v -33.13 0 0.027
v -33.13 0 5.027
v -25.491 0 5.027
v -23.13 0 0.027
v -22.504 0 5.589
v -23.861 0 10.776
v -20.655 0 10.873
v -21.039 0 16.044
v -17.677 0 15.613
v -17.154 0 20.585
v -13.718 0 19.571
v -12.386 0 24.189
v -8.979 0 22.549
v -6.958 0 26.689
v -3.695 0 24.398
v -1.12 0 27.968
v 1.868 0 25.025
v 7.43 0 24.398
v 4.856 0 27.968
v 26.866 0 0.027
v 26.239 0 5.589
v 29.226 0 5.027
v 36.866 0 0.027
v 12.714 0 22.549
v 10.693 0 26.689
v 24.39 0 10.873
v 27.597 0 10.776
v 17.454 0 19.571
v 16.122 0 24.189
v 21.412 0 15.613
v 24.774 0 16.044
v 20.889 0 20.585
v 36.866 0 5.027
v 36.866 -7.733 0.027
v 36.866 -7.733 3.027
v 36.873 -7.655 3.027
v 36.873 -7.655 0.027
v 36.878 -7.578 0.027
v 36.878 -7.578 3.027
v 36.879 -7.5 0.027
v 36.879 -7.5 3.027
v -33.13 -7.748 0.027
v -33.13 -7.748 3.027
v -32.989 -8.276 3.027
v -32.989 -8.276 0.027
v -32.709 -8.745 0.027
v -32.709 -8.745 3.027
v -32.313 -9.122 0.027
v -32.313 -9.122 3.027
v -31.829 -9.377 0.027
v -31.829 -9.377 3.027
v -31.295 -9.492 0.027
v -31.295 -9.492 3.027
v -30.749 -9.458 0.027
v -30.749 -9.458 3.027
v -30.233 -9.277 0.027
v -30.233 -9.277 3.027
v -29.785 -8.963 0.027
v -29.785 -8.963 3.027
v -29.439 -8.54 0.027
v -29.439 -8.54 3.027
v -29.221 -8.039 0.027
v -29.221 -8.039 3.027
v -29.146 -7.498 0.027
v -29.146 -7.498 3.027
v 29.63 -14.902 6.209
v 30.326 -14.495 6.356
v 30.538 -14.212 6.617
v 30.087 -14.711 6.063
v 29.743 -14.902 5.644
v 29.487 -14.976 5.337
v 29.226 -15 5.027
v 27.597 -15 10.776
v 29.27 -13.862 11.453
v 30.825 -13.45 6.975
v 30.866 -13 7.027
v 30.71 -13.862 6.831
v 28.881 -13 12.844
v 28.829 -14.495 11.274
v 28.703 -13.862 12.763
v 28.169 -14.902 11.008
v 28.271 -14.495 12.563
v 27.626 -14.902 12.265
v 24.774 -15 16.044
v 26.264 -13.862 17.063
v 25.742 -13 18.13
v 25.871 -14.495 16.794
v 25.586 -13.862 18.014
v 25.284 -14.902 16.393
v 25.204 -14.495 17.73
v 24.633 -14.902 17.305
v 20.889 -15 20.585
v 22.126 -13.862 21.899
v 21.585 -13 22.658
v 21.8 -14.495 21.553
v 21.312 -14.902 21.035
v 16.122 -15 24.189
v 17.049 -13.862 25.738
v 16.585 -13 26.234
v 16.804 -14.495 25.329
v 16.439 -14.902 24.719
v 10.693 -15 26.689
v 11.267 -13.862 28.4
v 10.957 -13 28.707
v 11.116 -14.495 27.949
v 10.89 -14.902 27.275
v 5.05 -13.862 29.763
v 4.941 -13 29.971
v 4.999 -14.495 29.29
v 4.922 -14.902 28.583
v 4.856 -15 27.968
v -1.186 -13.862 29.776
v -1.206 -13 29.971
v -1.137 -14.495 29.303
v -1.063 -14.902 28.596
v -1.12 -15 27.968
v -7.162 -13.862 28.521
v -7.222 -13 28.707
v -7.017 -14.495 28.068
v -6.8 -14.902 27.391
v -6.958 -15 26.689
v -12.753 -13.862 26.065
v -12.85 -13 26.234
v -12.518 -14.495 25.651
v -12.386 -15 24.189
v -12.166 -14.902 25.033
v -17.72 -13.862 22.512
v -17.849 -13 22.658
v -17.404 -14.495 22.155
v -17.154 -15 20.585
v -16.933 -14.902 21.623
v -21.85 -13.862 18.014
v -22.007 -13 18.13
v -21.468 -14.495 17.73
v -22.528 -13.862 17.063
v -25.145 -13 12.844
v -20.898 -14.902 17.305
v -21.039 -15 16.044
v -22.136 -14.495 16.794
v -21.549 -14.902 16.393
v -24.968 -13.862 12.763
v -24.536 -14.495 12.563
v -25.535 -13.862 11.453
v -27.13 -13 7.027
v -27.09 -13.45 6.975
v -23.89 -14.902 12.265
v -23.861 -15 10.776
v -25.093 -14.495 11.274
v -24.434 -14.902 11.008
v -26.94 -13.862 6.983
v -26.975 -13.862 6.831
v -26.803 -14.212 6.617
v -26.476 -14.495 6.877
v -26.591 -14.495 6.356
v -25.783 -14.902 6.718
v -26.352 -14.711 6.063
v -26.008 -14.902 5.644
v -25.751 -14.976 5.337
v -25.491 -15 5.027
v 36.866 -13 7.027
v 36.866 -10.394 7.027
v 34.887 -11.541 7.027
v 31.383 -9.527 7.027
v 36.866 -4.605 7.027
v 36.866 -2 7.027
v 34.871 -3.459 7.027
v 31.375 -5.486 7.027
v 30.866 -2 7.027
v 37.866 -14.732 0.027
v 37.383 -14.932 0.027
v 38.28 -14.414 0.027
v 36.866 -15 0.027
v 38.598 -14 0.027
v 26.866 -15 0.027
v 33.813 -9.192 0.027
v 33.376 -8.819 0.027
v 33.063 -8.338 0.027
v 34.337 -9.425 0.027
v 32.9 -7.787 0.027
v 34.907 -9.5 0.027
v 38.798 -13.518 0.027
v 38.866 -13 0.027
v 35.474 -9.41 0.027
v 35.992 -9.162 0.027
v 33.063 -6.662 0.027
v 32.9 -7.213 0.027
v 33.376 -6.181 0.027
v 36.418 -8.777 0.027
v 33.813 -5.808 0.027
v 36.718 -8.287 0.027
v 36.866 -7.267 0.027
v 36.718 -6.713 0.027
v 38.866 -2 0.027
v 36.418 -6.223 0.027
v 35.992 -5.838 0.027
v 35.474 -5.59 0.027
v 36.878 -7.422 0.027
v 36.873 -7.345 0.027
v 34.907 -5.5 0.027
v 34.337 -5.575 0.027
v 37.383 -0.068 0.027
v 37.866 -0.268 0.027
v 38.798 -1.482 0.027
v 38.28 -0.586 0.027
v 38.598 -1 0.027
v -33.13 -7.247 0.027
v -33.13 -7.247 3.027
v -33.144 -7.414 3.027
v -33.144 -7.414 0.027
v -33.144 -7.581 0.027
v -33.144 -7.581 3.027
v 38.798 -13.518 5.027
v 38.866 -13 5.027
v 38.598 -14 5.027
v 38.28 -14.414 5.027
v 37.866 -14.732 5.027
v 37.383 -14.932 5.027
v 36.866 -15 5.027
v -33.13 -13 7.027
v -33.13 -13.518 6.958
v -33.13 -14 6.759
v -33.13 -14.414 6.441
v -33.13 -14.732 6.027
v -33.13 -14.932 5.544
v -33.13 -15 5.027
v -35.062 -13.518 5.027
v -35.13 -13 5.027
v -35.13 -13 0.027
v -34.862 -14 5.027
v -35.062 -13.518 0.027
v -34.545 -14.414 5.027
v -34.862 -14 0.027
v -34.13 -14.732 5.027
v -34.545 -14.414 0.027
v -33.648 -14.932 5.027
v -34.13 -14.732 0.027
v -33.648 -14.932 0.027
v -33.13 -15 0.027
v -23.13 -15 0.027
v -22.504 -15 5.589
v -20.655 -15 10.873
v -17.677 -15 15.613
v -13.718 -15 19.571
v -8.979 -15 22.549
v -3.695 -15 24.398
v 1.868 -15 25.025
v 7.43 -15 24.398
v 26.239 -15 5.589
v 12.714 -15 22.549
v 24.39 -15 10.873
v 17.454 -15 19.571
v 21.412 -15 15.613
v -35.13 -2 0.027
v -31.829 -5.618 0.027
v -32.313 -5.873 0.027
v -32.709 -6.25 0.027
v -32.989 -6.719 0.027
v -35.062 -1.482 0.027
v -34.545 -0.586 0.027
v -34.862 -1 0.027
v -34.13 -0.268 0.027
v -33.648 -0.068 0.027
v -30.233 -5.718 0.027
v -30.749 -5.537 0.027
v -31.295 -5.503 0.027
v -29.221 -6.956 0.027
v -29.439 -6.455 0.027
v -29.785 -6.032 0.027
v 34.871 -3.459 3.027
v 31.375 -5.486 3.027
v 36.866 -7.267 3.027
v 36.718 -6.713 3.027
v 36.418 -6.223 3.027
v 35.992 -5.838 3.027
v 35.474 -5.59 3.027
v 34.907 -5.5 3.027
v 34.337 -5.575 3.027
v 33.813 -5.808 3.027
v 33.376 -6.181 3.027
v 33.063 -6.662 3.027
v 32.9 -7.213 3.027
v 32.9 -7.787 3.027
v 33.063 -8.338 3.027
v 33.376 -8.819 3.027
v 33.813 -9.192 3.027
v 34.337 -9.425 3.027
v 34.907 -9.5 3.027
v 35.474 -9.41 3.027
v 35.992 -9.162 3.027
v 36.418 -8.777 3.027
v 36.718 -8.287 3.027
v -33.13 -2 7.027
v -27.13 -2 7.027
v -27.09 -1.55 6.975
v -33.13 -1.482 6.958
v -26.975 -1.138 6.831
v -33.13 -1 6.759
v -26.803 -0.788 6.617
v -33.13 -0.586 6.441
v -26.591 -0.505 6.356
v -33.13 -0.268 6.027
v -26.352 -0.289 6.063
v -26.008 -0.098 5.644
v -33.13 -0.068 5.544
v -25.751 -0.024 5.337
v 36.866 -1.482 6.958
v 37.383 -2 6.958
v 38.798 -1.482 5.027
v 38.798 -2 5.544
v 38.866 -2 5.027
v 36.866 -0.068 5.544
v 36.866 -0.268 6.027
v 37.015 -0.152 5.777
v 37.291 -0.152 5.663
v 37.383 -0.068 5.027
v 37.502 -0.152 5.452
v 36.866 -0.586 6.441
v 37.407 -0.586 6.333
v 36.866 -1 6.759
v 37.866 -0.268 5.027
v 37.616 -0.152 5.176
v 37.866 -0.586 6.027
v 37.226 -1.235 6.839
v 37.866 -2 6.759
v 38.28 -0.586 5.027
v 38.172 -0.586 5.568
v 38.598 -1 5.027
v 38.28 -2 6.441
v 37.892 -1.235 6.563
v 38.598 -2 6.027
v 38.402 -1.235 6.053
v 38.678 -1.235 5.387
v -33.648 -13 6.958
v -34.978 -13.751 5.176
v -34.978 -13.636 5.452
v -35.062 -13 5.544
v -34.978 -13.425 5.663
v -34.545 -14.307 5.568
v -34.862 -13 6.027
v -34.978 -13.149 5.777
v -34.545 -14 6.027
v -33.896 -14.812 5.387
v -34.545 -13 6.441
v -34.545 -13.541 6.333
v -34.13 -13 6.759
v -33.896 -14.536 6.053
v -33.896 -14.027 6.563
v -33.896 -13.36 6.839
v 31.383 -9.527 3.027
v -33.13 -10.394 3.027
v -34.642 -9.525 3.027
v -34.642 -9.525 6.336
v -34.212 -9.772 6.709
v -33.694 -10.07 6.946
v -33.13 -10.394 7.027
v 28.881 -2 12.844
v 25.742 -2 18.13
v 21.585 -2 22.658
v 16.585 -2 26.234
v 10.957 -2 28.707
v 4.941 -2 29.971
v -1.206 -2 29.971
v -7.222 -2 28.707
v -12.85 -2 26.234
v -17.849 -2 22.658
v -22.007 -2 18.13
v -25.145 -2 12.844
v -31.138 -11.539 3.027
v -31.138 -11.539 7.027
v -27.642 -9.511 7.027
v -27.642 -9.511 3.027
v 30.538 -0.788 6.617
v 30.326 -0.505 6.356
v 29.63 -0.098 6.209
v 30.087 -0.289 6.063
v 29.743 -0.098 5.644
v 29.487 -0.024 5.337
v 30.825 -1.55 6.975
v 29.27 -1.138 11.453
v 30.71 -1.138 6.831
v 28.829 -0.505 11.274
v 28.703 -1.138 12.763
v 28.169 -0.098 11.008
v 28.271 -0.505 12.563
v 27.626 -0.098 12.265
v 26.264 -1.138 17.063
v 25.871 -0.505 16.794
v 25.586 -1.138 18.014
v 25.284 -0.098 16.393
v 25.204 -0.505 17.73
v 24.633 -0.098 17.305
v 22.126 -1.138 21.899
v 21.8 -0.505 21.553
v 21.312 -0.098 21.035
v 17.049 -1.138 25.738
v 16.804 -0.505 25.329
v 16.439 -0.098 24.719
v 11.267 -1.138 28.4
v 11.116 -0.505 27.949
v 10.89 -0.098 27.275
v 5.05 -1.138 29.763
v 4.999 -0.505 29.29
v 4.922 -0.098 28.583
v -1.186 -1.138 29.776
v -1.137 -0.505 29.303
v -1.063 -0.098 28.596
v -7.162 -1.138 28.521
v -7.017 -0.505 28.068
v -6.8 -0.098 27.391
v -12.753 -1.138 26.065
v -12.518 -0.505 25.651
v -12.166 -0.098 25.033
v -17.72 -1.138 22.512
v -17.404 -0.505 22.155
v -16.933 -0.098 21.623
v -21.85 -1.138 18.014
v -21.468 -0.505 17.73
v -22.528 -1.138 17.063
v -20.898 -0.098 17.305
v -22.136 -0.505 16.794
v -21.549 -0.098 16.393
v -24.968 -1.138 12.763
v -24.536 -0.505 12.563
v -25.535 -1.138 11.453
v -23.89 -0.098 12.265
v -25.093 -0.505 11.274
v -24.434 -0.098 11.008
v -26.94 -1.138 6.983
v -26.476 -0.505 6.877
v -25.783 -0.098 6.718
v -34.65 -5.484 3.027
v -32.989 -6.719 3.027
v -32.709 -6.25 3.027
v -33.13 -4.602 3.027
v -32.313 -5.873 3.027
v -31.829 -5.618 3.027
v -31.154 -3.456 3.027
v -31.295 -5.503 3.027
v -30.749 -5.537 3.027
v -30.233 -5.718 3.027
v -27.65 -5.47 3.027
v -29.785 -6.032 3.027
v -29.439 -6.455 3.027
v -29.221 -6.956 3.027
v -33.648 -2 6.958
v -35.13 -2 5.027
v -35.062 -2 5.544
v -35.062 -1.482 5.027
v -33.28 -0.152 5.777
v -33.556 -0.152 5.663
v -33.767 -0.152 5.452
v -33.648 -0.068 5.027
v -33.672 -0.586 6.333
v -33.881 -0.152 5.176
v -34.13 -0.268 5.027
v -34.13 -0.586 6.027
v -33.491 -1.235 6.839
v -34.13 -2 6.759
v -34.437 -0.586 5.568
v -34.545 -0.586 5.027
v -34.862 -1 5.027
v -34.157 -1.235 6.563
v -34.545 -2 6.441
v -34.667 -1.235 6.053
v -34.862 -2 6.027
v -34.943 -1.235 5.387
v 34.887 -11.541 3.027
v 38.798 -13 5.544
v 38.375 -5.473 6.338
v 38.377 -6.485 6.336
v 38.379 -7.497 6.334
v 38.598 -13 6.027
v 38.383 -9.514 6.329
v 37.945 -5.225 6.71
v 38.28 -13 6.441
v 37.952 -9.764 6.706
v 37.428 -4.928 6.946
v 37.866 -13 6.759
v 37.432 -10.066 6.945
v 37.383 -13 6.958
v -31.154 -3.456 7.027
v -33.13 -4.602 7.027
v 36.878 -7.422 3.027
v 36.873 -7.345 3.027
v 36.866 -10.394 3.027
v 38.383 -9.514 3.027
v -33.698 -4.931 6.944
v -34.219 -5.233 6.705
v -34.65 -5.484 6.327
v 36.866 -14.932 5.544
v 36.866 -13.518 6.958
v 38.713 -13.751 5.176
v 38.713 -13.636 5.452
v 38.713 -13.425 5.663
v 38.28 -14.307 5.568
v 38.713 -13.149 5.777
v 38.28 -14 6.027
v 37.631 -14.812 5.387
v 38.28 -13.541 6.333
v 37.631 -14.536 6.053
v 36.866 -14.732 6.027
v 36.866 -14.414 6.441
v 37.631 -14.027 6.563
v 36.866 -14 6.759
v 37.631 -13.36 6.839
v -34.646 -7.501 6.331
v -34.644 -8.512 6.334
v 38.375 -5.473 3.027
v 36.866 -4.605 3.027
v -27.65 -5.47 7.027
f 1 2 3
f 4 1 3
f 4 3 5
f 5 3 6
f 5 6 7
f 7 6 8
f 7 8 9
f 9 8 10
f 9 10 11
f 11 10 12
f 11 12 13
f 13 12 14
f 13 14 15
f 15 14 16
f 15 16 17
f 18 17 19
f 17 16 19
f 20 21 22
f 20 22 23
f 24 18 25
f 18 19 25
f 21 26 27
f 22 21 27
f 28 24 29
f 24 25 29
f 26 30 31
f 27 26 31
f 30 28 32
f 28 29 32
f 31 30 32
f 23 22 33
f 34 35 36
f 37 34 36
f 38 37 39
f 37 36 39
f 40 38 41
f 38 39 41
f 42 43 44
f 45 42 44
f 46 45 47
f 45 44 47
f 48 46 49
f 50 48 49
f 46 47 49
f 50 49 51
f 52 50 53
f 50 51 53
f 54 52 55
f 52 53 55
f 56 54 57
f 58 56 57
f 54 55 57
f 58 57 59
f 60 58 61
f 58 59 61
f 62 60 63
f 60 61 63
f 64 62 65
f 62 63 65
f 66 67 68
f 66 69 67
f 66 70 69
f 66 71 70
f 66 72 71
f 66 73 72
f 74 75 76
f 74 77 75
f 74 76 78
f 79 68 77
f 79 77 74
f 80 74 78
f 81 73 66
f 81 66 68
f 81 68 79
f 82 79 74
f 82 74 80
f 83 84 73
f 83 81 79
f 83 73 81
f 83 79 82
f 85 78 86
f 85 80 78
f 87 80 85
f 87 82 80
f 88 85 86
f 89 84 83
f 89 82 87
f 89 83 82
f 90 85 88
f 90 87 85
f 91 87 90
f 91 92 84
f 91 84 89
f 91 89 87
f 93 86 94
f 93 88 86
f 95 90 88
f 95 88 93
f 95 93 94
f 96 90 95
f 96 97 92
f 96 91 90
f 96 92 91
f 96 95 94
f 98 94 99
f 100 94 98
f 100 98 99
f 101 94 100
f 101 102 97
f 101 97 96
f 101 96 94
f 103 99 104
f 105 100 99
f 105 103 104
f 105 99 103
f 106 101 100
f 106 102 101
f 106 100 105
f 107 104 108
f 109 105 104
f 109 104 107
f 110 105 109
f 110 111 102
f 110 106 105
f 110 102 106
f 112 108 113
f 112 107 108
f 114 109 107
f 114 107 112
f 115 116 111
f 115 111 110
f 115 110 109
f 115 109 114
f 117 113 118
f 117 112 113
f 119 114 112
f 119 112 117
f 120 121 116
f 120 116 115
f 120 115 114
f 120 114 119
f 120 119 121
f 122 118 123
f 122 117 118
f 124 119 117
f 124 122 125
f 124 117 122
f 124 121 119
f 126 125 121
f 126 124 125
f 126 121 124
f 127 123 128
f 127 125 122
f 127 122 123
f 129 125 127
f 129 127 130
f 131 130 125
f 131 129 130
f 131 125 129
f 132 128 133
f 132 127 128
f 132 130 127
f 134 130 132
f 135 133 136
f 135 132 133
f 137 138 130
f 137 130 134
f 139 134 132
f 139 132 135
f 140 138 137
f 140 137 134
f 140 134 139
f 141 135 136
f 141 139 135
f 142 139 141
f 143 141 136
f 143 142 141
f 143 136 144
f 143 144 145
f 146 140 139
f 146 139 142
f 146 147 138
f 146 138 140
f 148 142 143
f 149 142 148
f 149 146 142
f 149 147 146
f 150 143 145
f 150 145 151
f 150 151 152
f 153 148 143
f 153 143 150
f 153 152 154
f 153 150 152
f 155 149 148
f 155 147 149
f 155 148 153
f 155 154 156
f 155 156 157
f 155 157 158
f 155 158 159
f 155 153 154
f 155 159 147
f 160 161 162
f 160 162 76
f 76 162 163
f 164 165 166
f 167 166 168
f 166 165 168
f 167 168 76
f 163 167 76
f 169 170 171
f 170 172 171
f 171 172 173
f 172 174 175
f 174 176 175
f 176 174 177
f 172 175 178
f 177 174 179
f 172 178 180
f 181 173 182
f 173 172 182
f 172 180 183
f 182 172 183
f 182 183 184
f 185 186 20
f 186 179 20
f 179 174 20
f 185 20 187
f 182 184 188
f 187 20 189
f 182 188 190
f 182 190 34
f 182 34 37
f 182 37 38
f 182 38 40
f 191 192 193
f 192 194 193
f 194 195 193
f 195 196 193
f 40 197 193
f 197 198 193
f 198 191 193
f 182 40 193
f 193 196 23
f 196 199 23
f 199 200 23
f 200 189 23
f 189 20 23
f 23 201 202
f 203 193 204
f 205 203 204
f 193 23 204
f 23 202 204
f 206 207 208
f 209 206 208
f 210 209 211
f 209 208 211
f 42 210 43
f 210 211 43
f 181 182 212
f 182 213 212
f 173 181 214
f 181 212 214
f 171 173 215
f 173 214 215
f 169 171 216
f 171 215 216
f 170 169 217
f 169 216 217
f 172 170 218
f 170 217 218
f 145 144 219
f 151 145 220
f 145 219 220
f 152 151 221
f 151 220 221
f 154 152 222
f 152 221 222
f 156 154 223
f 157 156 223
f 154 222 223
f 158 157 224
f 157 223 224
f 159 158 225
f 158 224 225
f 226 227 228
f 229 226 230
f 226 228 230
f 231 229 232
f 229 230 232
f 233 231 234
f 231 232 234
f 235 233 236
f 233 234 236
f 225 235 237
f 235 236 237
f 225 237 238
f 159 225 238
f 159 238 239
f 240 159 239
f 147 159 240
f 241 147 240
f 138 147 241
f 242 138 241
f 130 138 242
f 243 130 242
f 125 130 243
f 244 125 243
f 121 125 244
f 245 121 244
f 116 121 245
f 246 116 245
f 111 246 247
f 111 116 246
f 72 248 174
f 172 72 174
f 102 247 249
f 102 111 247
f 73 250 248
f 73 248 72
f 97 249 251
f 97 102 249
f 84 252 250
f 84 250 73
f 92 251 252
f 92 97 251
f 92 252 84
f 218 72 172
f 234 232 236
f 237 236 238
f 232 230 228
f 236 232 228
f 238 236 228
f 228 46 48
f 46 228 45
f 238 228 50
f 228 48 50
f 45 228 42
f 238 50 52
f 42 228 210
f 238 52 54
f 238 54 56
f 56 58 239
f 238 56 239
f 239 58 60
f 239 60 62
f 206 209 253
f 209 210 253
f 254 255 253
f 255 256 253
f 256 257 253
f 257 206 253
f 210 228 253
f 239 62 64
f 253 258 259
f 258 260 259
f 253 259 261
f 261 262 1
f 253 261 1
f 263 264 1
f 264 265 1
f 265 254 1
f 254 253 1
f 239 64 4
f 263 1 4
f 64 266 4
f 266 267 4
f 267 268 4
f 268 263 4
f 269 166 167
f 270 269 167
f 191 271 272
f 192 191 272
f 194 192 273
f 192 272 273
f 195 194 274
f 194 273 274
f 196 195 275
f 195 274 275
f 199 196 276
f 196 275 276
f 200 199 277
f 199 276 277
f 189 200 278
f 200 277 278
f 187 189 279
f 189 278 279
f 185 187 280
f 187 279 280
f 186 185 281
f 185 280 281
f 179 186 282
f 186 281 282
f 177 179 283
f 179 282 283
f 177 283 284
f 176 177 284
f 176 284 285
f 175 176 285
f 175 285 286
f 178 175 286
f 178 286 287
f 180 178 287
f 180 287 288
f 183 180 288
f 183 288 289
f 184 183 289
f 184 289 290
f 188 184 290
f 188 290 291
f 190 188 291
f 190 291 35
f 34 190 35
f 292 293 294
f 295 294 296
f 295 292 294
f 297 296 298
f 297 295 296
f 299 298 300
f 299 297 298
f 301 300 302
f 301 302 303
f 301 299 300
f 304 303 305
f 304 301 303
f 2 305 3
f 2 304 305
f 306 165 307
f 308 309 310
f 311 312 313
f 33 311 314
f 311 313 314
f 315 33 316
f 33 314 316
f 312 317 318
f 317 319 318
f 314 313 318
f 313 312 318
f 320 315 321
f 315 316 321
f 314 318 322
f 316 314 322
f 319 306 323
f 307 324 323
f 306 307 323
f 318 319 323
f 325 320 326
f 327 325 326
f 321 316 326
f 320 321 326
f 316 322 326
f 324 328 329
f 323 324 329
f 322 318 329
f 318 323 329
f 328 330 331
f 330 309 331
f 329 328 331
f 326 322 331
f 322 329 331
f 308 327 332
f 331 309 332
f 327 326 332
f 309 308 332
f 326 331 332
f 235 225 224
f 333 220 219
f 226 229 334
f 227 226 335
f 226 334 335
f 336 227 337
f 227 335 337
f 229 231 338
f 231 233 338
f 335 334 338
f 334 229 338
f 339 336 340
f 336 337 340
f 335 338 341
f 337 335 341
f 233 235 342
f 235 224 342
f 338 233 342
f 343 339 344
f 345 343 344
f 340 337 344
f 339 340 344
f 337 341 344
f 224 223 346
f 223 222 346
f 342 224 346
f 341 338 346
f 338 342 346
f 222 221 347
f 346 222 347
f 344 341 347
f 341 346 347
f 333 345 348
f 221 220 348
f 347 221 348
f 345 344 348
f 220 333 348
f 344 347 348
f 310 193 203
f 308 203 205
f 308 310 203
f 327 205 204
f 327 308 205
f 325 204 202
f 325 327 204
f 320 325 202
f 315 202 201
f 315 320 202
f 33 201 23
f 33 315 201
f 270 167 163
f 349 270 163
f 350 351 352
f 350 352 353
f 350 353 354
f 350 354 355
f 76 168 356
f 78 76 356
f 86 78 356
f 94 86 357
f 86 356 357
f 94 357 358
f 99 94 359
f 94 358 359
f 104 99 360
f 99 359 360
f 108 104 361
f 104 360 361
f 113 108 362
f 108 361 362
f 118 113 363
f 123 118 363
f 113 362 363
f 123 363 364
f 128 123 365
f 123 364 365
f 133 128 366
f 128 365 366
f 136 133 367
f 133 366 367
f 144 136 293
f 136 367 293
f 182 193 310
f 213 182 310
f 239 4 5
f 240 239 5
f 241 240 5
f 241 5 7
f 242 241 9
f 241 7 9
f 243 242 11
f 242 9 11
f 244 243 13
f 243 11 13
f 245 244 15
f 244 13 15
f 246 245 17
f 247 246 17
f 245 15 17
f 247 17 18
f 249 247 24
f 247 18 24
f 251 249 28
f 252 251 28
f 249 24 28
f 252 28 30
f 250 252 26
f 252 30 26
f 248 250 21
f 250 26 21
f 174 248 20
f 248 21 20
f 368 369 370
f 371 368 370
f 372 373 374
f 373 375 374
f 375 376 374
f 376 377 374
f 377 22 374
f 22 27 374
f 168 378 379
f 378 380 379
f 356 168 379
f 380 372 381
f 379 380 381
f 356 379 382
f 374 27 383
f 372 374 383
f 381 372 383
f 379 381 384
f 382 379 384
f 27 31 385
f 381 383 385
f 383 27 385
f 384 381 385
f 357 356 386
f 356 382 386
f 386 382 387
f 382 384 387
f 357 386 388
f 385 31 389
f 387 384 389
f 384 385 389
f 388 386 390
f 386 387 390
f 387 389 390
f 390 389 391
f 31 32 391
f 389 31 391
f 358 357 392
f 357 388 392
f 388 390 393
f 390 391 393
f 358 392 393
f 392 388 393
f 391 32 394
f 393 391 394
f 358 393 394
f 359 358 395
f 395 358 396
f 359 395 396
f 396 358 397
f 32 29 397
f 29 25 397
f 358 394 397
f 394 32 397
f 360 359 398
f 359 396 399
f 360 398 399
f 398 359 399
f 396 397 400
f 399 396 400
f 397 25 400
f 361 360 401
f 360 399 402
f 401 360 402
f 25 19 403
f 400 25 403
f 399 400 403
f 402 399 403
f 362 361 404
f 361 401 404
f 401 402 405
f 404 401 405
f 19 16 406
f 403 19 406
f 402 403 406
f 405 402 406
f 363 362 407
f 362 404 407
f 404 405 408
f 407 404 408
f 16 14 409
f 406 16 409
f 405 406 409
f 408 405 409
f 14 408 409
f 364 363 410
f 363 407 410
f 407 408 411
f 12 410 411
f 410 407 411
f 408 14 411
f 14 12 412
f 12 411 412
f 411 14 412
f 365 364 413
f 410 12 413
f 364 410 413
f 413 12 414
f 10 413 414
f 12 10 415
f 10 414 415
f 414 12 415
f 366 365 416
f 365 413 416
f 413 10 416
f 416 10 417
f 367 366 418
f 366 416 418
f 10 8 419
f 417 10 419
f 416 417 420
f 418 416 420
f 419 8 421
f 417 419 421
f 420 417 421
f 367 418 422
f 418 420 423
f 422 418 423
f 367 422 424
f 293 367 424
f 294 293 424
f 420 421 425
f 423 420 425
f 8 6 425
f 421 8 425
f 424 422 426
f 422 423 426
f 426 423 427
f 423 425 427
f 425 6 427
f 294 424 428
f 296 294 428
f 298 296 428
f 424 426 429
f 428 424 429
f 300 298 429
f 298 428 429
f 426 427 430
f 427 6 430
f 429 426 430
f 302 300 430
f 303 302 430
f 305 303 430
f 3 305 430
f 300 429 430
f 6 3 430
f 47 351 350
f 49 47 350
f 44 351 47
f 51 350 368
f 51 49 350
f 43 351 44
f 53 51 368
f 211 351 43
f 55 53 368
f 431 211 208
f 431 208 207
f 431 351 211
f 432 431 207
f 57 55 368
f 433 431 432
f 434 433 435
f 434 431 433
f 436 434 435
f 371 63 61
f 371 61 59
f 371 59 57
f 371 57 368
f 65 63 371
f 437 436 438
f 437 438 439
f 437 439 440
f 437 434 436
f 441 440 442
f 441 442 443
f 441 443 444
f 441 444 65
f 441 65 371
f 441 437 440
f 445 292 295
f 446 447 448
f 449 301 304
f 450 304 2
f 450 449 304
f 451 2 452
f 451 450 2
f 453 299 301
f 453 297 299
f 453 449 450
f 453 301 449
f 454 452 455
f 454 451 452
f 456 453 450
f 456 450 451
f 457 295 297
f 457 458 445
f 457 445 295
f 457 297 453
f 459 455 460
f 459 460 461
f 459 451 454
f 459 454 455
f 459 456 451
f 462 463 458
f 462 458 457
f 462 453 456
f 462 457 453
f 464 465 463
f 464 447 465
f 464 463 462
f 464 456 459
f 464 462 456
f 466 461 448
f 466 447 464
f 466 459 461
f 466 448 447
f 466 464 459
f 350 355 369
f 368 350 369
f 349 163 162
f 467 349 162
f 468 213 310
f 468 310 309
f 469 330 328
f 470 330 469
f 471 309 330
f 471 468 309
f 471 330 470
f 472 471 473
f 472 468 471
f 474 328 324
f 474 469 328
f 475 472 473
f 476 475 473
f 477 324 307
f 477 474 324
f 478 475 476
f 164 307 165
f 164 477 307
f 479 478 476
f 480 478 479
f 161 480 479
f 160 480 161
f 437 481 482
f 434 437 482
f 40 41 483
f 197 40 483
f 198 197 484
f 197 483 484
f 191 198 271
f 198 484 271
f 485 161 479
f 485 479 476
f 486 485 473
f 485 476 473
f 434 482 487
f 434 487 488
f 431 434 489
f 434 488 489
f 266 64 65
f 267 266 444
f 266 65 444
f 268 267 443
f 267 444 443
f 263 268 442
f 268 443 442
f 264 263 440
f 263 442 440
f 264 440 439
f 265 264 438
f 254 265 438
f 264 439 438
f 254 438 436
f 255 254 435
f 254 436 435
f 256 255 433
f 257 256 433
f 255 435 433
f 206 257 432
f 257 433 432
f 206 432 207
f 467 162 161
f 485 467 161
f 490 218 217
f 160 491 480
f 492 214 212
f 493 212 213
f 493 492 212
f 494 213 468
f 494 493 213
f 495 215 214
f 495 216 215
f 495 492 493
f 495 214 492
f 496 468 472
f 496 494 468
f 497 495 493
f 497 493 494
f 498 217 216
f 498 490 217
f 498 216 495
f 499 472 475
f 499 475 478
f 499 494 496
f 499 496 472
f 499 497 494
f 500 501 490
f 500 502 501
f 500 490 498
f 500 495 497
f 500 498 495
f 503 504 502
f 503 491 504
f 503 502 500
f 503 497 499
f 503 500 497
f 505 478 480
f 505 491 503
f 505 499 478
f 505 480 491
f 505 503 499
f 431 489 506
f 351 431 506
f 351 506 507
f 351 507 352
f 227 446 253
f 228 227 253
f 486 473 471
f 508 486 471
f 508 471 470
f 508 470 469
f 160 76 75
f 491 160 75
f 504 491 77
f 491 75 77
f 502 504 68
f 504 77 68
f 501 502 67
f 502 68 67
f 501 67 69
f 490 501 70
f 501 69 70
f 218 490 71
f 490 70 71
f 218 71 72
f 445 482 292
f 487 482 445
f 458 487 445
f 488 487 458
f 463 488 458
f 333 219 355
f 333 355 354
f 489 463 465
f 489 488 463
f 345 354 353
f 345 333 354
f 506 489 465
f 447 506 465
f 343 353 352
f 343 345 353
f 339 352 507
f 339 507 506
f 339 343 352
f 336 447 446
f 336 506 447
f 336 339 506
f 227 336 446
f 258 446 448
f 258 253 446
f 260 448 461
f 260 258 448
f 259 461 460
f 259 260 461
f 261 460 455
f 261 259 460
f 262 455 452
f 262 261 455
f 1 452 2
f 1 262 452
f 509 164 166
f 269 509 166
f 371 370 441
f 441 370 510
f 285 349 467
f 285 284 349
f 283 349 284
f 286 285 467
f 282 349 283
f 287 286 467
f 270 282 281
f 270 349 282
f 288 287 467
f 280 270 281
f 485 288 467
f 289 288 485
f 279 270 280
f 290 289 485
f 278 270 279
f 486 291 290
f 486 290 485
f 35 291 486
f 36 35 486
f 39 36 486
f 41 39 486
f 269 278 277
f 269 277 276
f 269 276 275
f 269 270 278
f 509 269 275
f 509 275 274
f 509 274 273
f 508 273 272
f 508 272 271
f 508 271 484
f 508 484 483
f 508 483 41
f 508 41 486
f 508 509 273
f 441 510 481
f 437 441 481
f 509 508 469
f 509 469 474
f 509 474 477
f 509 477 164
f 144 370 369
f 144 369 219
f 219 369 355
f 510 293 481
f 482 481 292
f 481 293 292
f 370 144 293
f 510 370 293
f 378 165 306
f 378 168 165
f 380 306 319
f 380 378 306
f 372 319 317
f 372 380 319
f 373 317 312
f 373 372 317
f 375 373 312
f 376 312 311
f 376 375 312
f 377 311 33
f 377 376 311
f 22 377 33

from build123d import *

# Parameters (mm, degrees)
F1_DEPTH  = 15
F2_R      = 2
F4_DEPTH  = 25
F5_DEPTH  = 4
F6_DEPTH  = 25
F8_DEPTH  = 25
F9_DEPTH  = 4
F10_DEPTH = 25


with BuildPart() as f1:
    # F0 (on Front) → F1 (new body)
    with BuildSketch(Plane.XZ):
        with BuildLine():
            ThreePointArc((-23.1304047869, 0.0265709655), (1.8676618749, 25.0246376273), (26.8657285366, 0.0265709655))
            Line((26.8657285366, 0.0265709655), (38.8657285366, 0.0265709655))
            Line((38.8657285366, 0.0265709655), (38.8657285366, 7.0265709655))
            Line((38.8657285366, 7.0265709655), (30.8657285366, 7.0265709655))
            ThreePointArc((30.8657285366, 7.0265709655), (1.8676618749, 30.1297350471), (-27.1304047869, 7.0265709655))
            Line((-27.1304047869, 7.0265709655), (-35.1304047869, 7.0265709655))
            Line((-35.1304047869, 7.0265709655), (-35.1304047869, 0.0265709655))
            Line((-35.1304047869, 0.0265709655), (-23.1304047869, 0.0265709655))
        make_face()
    extrude(amount=F1_DEPTH)

    # F2
    f2_edges = [f1.edges().sort_by_distance(p)[0] for p in [
        (1.867662, -15, 30.129735),
        (34.865729, -15, 7.026571),
        (38.865729, -15, 3.526571),
        (38.865729, -7.5, 7.026571),
        (-31.130405, -15, 7.026571),
        (-35.130405, -15, 3.526571),
        (-35.130405, -7.5, 7.026571),
        (1.867662, 0, 30.129735),
        (-31.130405, 0, 7.026571),
        (-35.130405, 0, 3.526571),
        (34.865729, 0, 7.026571),
        (38.865729, 0, 3.526571),
    ]]
    fillet(f2_edges, radius=F2_R)

    # F3 (on face) → F4 (cut)
    with BuildSketch(Plane.XY.offset(7.0265709655)):
        with BuildLine():
            ThreePointArc((36.8657285366, -7.7325071808), (36.875896312, -7.6164511554), (36.8792894082, -7.5))
            ThreePointArc((36.8792894082, -7.5), (36.875896312, -7.3835488446), (36.8657285366, -7.2674928192))
            Line((36.8657285366, -7.2674928192), (36.8657285366, -7.7325071808))
        make_face()
    extrude(amount=-F4_DEPTH, mode=Mode.SUBTRACT)

    # F3 (on face) → F5 (cut)
    with BuildSketch(Plane.XY.offset(7.0265709655)):
        with BuildLine():
            ThreePointArc((36.8657285366, -7.7325071808), (32.8792894082, -7.5), (36.8657285366, -7.2674928192))
            Line((36.8657285366, -7.2674928192), (36.8657285366, -4.6048032856))
            Line((36.8657285366, -4.6048032856), (34.8714804252, -3.45855566))
            Line((34.8714804252, -3.45855566), (31.3753914503, -5.4860406077))
            Line((31.3753914503, -5.4860406077), (31.3832004333, -9.5274849477))
            Line((31.3832004333, -9.5274849477), (34.8870983913, -11.54144434))
            Line((34.8870983913, -11.54144434), (36.8657285366, -10.3939784529))
            Line((36.8657285366, -10.3939784529), (36.8657285366, -7.7325071808))
        make_face()
        with BuildLine():
            ThreePointArc((36.8657285366, -7.2674928192), (36.875896312, -7.3835488446), (36.8792894082, -7.5))
            ThreePointArc((36.8792894082, -7.5), (36.875896312, -7.6164511554), (36.8657285366, -7.7325071808))
            Line((36.8657285366, -7.7325071808), (36.8657285366, -10.3939784529))
            Line((36.8657285366, -10.3939784529), (38.3831873661, -9.5139593923))
            Line((38.3831873661, -9.5139593923), (38.3753783831, -5.4725150523))
            Line((38.3753783831, -5.4725150523), (36.8657285366, -4.6048032856))
            Line((36.8657285366, -4.6048032856), (36.8657285366, -7.2674928192))
        make_face()
    extrude(amount=-F5_DEPTH, mode=Mode.SUBTRACT)

    # F3 (on face) → F6 (cut)
    with BuildSketch(Plane.XY.offset(7.0265709655)):
        with BuildLine():
            Line((36.8657285366, -7.7325071808), (36.8657285366, -7.2674928192))
            ThreePointArc((36.8657285366, -7.2674928192), (32.8792894082, -7.5), (36.8657285366, -7.7325071808))
        make_face()
    extrude(amount=-F6_DEPTH, mode=Mode.SUBTRACT)

    # F7 (on face) → F8 (cut)
    with BuildSketch(Plane.XY.offset(7.0265709655)):
        with BuildLine():
            ThreePointArc((-33.1304047869, -7.74764379), (-31.0207948898, -9.4935798639), (-29.1461082168, -7.4975095821))
            ThreePointArc((-29.1461082168, -7.4975095821), (-31.0207948898, -5.5014393002), (-33.1304047869, -7.2473753741))
            Line((-33.1304047869, -7.2473753741), (-33.1304047869, -7.74764379))
        make_face()
    extrude(amount=-F8_DEPTH, mode=Mode.SUBTRACT)

    # F7 (on face) → F9 (cut)
    with BuildSketch(Plane.XY.offset(7.0265709655)):
        with BuildLine():
            ThreePointArc((-33.1304047869, -7.74764379), (-33.1461082168, -7.4975095821), (-33.1304047869, -7.2473753741))
            Line((-33.1304047869, -7.2473753741), (-33.1304047869, -4.6022885965))
            Line((-33.1304047869, -4.6022885965), (-34.6500061748, -5.4835501898))
            Line((-34.6500061748, -5.4835501898), (-34.6421971917, -9.5249945298))
            Line((-34.6421971917, -9.5249945298), (-33.1304047869, -10.3939377894))
            Line((-33.1304047869, -10.3939377894), (-33.1304047869, -7.74764379))
        make_face()
        with BuildLine():
            ThreePointArc((-33.1304047869, -7.2473753741), (-31.0207948898, -5.5014393002), (-29.1461082168, -7.4975095821))
            ThreePointArc((-29.1461082168, -7.4975095821), (-31.0207948898, -9.4935798639), (-33.1304047869, -7.74764379))
            Line((-33.1304047869, -7.74764379), (-33.1304047869, -10.3939377894))
            Line((-33.1304047869, -10.3939377894), (-31.1382992338, -11.5389539221))
            Line((-31.1382992338, -11.5389539221), (-27.6422102589, -9.5114689744))
            Line((-27.6422102589, -9.5114689744), (-27.650019242, -5.4700246344))
            Line((-27.650019242, -5.4700246344), (-31.1539171999, -3.4560652421))
            Line((-31.1539171999, -3.4560652421), (-33.1304047869, -4.6022885965))
            Line((-33.1304047869, -4.6022885965), (-33.1304047869, -7.2473753741))
        make_face()
    extrude(amount=-F9_DEPTH, mode=Mode.SUBTRACT)

    # F7 (on face) → F10 (cut)
    with BuildSketch(Plane.XY.offset(7.0265709655)):
        with BuildLine():
            Line((-33.1304047869, -7.74764379), (-33.1304047869, -7.2473753741))
            ThreePointArc((-33.1304047869, -7.2473753741), (-33.1461082168, -7.4975095821), (-33.1304047869, -7.74764379))
        make_face()
    extrude(amount=-F10_DEPTH, mode=Mode.SUBTRACT)


solid = f1.part
